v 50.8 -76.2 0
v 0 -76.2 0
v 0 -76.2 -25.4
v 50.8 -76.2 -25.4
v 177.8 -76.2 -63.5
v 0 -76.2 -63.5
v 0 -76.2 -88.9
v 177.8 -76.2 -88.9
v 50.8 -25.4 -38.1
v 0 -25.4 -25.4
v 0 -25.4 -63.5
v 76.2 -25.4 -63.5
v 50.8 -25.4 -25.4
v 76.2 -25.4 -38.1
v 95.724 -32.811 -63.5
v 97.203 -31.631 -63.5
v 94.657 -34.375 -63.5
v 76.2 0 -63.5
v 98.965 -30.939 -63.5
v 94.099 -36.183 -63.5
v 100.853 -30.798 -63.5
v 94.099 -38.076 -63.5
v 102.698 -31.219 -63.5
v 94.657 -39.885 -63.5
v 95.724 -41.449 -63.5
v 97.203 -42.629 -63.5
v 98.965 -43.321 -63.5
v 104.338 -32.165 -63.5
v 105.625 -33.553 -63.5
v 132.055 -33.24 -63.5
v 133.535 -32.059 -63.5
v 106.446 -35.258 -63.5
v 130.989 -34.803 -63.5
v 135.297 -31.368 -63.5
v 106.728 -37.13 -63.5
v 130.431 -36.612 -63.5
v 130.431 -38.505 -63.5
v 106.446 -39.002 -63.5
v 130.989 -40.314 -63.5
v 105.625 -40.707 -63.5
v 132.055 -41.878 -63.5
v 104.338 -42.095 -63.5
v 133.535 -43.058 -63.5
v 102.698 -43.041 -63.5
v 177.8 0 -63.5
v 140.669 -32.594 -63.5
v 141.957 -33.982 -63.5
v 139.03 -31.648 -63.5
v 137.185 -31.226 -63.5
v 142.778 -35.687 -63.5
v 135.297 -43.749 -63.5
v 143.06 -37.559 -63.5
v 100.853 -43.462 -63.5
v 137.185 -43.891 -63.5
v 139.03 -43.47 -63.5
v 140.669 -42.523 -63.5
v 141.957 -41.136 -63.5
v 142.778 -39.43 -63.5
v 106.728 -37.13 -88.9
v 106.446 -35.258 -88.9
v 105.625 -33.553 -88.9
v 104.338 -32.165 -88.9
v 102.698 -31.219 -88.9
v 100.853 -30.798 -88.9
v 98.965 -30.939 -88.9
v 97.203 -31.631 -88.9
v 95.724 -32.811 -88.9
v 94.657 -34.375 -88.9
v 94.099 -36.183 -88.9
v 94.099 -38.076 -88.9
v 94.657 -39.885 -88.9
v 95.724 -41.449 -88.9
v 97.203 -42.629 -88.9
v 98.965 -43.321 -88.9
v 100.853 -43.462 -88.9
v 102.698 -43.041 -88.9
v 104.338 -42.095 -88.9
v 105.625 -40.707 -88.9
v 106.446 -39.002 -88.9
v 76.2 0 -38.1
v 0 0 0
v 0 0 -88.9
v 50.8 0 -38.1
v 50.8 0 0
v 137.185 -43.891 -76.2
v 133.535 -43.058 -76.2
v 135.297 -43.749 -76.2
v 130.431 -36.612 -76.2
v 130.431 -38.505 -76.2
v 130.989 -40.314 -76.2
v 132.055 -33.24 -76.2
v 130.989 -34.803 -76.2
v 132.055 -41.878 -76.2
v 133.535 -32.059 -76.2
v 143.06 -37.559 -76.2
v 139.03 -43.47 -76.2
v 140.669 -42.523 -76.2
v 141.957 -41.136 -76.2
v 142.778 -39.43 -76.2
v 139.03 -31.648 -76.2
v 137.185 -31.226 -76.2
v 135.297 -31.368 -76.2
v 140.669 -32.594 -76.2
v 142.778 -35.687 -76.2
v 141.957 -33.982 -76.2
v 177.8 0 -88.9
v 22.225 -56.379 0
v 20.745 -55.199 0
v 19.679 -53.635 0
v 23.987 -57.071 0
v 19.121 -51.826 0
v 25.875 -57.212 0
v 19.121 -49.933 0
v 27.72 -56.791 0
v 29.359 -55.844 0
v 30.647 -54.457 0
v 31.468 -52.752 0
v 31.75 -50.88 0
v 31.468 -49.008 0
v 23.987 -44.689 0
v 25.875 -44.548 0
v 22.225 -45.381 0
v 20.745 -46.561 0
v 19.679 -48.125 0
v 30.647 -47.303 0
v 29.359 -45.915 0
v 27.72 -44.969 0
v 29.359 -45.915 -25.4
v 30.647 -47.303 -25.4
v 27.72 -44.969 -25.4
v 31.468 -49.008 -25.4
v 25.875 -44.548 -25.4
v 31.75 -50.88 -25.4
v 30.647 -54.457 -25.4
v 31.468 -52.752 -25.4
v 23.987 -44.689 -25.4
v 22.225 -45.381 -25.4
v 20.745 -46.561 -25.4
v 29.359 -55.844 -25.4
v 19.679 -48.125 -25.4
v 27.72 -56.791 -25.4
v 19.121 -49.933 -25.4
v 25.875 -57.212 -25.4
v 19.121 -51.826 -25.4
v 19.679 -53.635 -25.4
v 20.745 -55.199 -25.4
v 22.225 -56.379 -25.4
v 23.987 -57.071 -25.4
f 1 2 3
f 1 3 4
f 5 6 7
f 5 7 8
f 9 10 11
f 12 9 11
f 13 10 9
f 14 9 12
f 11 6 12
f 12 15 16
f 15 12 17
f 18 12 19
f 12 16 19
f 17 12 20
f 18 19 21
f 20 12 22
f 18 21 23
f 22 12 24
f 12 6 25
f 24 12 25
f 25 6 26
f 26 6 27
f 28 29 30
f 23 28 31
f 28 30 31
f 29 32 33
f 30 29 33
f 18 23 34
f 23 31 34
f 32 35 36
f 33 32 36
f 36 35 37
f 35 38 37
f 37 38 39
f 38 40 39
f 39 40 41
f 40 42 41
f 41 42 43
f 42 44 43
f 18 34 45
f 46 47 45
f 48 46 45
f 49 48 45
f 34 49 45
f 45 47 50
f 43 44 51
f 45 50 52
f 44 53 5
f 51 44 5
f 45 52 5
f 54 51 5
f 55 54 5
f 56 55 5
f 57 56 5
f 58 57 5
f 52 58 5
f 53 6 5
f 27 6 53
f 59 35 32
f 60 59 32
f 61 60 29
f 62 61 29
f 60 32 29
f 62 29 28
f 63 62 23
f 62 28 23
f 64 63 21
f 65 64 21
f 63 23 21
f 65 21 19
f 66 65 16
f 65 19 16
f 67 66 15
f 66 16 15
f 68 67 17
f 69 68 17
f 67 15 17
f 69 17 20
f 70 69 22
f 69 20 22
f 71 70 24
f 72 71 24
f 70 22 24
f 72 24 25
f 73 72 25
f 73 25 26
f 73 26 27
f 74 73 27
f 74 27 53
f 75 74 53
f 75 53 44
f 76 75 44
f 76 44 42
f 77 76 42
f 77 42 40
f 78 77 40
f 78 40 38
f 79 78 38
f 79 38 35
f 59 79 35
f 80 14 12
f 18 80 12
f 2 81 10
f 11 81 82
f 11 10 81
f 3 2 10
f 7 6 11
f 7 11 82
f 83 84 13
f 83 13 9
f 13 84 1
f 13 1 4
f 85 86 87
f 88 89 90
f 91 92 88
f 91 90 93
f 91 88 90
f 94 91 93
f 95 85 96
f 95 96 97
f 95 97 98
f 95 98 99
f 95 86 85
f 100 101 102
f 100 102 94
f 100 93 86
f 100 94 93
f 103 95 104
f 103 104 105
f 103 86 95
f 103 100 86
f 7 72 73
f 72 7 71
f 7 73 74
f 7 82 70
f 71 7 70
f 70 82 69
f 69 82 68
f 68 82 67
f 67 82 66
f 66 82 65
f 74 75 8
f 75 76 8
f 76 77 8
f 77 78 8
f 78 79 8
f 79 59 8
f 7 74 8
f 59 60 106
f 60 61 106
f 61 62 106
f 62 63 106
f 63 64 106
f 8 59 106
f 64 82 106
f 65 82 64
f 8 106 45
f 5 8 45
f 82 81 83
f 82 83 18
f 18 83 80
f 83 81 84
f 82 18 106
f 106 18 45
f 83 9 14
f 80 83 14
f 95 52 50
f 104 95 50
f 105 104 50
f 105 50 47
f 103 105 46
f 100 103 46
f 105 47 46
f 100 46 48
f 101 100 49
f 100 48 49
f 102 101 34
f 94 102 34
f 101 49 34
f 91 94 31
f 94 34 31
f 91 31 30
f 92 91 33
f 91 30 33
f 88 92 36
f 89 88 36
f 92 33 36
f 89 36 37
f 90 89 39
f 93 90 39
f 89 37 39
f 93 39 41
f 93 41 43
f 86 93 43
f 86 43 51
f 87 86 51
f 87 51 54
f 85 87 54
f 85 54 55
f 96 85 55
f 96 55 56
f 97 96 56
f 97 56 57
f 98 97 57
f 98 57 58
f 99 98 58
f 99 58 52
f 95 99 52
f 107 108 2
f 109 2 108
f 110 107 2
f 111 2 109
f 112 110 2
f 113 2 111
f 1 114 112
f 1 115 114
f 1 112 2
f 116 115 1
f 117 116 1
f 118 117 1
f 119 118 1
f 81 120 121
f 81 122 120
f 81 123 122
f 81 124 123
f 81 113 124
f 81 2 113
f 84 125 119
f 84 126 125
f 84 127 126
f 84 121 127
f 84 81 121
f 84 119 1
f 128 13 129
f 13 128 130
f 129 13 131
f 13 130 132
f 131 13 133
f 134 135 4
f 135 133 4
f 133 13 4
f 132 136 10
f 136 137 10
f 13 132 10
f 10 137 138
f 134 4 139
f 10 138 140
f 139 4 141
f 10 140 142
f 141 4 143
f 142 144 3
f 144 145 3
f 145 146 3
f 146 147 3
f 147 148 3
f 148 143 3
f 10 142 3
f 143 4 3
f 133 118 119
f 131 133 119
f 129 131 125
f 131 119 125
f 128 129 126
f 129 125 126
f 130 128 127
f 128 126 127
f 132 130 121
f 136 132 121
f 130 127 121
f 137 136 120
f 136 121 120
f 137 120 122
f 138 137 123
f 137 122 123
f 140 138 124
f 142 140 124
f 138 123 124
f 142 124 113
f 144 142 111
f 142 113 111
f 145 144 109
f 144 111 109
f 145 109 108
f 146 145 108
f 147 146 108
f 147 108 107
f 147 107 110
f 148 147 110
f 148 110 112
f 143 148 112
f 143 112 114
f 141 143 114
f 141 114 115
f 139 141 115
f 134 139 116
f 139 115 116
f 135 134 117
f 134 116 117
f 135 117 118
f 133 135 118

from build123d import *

# Parameters (mm, degrees)
F0_W      = 177.8
F0_H      = 88.9
F1_DEPTH  = 76.2
F2_W      = 50.8
F2_H      = 25.4
F3_DEPTH  = 76.2
F4_DEPTH  = 76.2
F5_DEPTH  = 76.2
F6_DEPTH  = 50.8
F7_DEPTH  = 50.8
F8_R      = 6.35
F9_DEPTH  = 25.4
F11_DEPTH = 25.4
F12_DEPTH = 25.4
F13_R     = 6.35
F14_DEPTH = 25.4
F15_R     = 6.35
F16_DEPTH = 50.8
F17_R     = 6.35
F18_DEPTH = 76.2


with BuildPart() as f1:
    # F0 (on Front) → F1 (new body)
    with BuildSketch(Plane.XZ):
        with Locations((88.9, -44.45)):
            Rectangle(F0_W, F0_H)
    extrude(amount=F1_DEPTH)

    # F2 (on face) → F3 (join)
    with BuildSketch(Plane.XZ.offset(76.2)):
        with Locations((25.4, -12.7)):
            Rectangle(F2_W, F2_H)
        Polygon((0, -63.5), (0, -88.9), (177.8, -88.9), (177.8, -63.5), (76.2, -63.5), align=None)
        Polygon((0, -25.4), (0, -63.5), (76.2, -63.5), (76.2, -38.1), (50.8, -38.1), (50.8, -25.4), align=None)
    extrude(amount=-F3_DEPTH)

    # F2 (on face) → F4 (join)
    with BuildSketch(Plane.XZ.offset(76.2)):
        with Locations((25.4, -12.7)):
            Rectangle(F2_W, F2_H)
        Polygon((0, -25.4), (0, -63.5), (76.2, -63.5), (76.2, -38.1), (50.8, -38.1), (50.8, -25.4), align=None)
        Polygon((0, -63.5), (0, -88.9), (177.8, -88.9), (177.8, -63.5), (76.2, -63.5), align=None)
    extrude(amount=-F4_DEPTH)

    # F2 (on face) → F5 (cut)
    with BuildSketch(Plane.XZ.offset(76.2)):
        Polygon((76.2, -38.1), (76.2, -63.5), (177.8, -63.5), (177.8, 0), (50.8, 0), (50.8, -25.4), (50.8, -38.1), align=None)
    extrude(amount=-F5_DEPTH, mode=Mode.SUBTRACT)

    # F2 (on face) → F6 (join)
    with BuildSketch(Plane.XZ.offset(76.2)):
        Polygon((0, -25.4), (0, -63.5), (76.2, -63.5), (76.2, -38.1), (50.8, -38.1), (50.8, -25.4), align=None)
    extrude(amount=-F6_DEPTH)

    # F2 (on face) → F7 (cut)
    with BuildSketch(Plane.XZ.offset(76.2)):
        Polygon((0, -25.4), (0, -63.5), (76.2, -63.5), (76.2, -38.1), (50.8, -38.1), (50.8, -25.4), align=None)
    extrude(amount=-F7_DEPTH, mode=Mode.SUBTRACT)

    # F8 (on Top) → F9 (join)
    with BuildSketch(Plane.XY):
        with Locations((25.4, -50.079788)):
            Circle(F8_R)
    extrude(amount=-F9_DEPTH)

    # F10 (on Top) → F11 (cut)
    with BuildSketch(Plane.XY):
        with BuildLine():
            ThreePointArc((19.05, -50.879826), (25.4, -57.229826), (31.75, -50.879826))
            ThreePointArc((31.75, -50.879826), (25.4, -44.529826), (19.05, -50.879826))
        make_face()
    extrude(amount=-F11_DEPTH, mode=Mode.SUBTRACT)

    # F10 (on Top) → F12 (cut)
    with BuildSketch(Plane.XY):
        with BuildLine():
            ThreePointArc((19.05, -50.879826), (25.4, -57.229826), (31.75, -50.879826))
            ThreePointArc((31.75, -50.879826), (25.4, -44.529826), (19.05, -50.879826))
        make_face()
    extrude(amount=-F12_DEPTH, mode=Mode.SUBTRACT)

    # F13 (on Top) → F14 (cut)
    with BuildSketch(Plane.XY):
        with Locations((139.137983, -37.799459)):
            Circle(F13_R)
        with Locations((101.160564, -37.799459)):
            Circle(F13_R)
    extrude(amount=-F14_DEPTH, mode=Mode.SUBTRACT)

    # F15 (on face) → F16 (cut)
    with BuildSketch(Plane.XY.offset(-63.5)):
        with Locations((100.378424, -37.129913)):
            Circle(F15_R)
    extrude(amount=-F16_DEPTH, mode=Mode.SUBTRACT)

    # F17 (on Top) → F18 (cut)
    with BuildSketch(Plane.XY):
        with Locations((136.710018, -37.558652)):
            Circle(F17_R)
    extrude(amount=-F18_DEPTH, mode=Mode.SUBTRACT)


solid = f1.part
